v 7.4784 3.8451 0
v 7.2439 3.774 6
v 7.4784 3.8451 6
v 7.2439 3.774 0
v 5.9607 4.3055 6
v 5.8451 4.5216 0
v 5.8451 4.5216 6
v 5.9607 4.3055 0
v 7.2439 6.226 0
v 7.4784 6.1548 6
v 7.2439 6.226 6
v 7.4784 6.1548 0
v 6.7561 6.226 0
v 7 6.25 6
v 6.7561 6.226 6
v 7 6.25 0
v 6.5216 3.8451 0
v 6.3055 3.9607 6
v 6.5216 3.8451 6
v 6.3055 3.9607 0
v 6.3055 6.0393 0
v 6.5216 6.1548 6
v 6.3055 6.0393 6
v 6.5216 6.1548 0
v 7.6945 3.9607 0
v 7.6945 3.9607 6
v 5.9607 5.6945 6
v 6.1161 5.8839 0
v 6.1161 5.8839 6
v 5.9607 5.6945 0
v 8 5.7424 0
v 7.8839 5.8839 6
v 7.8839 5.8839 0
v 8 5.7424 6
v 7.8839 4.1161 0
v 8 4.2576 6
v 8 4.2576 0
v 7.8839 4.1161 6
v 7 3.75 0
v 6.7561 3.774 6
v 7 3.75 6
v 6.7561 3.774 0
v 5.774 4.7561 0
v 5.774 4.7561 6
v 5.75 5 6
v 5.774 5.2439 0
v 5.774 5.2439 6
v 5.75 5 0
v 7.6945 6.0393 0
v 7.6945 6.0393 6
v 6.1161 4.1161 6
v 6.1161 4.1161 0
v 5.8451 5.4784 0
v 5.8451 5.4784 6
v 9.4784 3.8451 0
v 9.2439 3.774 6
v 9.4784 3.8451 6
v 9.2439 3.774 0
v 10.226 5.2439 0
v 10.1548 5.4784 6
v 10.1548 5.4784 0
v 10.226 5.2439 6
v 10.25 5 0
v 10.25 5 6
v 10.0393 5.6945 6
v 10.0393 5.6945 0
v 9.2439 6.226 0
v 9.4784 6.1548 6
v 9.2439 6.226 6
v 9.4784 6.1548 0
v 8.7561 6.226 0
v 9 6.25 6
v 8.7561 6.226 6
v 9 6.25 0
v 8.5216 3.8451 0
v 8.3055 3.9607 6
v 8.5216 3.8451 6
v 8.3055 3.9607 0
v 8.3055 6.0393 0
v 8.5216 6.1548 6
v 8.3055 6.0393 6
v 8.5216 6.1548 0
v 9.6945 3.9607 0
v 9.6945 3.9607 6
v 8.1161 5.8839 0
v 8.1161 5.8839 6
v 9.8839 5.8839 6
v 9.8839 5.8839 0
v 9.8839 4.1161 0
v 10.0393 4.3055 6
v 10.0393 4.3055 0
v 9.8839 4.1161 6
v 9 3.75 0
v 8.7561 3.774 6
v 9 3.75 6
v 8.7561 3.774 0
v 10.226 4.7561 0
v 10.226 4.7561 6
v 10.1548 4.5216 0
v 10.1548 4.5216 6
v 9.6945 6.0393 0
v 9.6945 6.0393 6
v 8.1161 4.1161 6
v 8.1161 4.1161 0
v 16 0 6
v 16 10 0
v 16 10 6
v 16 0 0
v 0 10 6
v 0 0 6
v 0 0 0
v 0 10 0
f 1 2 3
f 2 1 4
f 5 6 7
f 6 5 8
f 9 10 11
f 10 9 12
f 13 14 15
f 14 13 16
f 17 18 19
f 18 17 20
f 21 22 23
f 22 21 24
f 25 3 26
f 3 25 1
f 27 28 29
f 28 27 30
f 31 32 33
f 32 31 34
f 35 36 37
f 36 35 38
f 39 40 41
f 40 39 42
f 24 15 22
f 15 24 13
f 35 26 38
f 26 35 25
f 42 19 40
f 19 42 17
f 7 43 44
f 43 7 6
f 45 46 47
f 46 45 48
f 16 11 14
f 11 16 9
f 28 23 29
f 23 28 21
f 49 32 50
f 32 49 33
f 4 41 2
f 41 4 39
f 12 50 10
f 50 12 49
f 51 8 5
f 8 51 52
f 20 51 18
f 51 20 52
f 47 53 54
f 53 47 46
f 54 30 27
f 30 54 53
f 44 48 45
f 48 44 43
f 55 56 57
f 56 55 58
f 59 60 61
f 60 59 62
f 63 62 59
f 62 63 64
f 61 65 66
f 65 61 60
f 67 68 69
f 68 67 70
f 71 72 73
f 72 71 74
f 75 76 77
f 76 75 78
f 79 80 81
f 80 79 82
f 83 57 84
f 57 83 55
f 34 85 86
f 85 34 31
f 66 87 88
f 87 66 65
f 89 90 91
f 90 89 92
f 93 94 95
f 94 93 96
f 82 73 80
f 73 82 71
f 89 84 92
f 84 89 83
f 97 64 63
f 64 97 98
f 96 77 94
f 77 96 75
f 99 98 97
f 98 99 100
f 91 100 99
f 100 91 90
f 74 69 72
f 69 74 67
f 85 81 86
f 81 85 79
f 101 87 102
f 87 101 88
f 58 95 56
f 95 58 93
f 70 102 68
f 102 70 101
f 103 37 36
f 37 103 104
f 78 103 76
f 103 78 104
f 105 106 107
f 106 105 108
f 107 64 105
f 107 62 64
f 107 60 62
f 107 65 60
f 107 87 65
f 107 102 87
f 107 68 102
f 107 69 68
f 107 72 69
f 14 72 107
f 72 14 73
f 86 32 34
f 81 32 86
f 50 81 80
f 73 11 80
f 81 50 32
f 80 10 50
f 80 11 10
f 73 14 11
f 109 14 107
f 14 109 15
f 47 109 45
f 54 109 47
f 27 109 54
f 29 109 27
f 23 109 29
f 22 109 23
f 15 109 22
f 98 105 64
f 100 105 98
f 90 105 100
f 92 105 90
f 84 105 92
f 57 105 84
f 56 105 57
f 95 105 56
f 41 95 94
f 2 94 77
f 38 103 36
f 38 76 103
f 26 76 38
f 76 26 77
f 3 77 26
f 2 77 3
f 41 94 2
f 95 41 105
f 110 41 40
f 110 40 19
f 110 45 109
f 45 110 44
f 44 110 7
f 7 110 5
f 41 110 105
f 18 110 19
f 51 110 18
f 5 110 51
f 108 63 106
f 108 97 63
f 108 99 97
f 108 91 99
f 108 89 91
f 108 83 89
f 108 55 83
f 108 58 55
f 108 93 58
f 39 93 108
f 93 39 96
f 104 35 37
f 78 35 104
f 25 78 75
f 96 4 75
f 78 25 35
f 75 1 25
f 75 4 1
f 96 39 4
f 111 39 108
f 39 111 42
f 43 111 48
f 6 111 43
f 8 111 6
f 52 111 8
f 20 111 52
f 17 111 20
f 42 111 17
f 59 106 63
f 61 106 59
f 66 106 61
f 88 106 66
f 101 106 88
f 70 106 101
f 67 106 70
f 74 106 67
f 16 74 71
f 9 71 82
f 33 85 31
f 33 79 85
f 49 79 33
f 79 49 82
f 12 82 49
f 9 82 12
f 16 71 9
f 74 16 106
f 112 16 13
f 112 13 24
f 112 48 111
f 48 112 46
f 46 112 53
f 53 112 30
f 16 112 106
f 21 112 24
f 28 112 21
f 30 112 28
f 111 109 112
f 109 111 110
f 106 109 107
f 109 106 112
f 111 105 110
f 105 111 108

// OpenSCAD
$fn = 32;

// ----------------------------------------------------------------------
// Micro pad: two-hole pad, 5-20 mm class
// ----------------------------------------------------------------------

// --- parameters (mm) ---
pad_l = 16;               // pad length, X
pad_w = 10;               // pad width, Y
pad_t = 6;                // pad thickness, Z
hole_d = 2.5;             // hole diameter
hole_x = 7;               // X of the first hole centre

difference() {
  cube([pad_l, pad_w, pad_t]);
  for (x = [hole_x, pad_l - hole_x])
    translate([x, pad_w / 2, -1])
      cylinder(h = pad_t + 2, d = hole_d);
}
